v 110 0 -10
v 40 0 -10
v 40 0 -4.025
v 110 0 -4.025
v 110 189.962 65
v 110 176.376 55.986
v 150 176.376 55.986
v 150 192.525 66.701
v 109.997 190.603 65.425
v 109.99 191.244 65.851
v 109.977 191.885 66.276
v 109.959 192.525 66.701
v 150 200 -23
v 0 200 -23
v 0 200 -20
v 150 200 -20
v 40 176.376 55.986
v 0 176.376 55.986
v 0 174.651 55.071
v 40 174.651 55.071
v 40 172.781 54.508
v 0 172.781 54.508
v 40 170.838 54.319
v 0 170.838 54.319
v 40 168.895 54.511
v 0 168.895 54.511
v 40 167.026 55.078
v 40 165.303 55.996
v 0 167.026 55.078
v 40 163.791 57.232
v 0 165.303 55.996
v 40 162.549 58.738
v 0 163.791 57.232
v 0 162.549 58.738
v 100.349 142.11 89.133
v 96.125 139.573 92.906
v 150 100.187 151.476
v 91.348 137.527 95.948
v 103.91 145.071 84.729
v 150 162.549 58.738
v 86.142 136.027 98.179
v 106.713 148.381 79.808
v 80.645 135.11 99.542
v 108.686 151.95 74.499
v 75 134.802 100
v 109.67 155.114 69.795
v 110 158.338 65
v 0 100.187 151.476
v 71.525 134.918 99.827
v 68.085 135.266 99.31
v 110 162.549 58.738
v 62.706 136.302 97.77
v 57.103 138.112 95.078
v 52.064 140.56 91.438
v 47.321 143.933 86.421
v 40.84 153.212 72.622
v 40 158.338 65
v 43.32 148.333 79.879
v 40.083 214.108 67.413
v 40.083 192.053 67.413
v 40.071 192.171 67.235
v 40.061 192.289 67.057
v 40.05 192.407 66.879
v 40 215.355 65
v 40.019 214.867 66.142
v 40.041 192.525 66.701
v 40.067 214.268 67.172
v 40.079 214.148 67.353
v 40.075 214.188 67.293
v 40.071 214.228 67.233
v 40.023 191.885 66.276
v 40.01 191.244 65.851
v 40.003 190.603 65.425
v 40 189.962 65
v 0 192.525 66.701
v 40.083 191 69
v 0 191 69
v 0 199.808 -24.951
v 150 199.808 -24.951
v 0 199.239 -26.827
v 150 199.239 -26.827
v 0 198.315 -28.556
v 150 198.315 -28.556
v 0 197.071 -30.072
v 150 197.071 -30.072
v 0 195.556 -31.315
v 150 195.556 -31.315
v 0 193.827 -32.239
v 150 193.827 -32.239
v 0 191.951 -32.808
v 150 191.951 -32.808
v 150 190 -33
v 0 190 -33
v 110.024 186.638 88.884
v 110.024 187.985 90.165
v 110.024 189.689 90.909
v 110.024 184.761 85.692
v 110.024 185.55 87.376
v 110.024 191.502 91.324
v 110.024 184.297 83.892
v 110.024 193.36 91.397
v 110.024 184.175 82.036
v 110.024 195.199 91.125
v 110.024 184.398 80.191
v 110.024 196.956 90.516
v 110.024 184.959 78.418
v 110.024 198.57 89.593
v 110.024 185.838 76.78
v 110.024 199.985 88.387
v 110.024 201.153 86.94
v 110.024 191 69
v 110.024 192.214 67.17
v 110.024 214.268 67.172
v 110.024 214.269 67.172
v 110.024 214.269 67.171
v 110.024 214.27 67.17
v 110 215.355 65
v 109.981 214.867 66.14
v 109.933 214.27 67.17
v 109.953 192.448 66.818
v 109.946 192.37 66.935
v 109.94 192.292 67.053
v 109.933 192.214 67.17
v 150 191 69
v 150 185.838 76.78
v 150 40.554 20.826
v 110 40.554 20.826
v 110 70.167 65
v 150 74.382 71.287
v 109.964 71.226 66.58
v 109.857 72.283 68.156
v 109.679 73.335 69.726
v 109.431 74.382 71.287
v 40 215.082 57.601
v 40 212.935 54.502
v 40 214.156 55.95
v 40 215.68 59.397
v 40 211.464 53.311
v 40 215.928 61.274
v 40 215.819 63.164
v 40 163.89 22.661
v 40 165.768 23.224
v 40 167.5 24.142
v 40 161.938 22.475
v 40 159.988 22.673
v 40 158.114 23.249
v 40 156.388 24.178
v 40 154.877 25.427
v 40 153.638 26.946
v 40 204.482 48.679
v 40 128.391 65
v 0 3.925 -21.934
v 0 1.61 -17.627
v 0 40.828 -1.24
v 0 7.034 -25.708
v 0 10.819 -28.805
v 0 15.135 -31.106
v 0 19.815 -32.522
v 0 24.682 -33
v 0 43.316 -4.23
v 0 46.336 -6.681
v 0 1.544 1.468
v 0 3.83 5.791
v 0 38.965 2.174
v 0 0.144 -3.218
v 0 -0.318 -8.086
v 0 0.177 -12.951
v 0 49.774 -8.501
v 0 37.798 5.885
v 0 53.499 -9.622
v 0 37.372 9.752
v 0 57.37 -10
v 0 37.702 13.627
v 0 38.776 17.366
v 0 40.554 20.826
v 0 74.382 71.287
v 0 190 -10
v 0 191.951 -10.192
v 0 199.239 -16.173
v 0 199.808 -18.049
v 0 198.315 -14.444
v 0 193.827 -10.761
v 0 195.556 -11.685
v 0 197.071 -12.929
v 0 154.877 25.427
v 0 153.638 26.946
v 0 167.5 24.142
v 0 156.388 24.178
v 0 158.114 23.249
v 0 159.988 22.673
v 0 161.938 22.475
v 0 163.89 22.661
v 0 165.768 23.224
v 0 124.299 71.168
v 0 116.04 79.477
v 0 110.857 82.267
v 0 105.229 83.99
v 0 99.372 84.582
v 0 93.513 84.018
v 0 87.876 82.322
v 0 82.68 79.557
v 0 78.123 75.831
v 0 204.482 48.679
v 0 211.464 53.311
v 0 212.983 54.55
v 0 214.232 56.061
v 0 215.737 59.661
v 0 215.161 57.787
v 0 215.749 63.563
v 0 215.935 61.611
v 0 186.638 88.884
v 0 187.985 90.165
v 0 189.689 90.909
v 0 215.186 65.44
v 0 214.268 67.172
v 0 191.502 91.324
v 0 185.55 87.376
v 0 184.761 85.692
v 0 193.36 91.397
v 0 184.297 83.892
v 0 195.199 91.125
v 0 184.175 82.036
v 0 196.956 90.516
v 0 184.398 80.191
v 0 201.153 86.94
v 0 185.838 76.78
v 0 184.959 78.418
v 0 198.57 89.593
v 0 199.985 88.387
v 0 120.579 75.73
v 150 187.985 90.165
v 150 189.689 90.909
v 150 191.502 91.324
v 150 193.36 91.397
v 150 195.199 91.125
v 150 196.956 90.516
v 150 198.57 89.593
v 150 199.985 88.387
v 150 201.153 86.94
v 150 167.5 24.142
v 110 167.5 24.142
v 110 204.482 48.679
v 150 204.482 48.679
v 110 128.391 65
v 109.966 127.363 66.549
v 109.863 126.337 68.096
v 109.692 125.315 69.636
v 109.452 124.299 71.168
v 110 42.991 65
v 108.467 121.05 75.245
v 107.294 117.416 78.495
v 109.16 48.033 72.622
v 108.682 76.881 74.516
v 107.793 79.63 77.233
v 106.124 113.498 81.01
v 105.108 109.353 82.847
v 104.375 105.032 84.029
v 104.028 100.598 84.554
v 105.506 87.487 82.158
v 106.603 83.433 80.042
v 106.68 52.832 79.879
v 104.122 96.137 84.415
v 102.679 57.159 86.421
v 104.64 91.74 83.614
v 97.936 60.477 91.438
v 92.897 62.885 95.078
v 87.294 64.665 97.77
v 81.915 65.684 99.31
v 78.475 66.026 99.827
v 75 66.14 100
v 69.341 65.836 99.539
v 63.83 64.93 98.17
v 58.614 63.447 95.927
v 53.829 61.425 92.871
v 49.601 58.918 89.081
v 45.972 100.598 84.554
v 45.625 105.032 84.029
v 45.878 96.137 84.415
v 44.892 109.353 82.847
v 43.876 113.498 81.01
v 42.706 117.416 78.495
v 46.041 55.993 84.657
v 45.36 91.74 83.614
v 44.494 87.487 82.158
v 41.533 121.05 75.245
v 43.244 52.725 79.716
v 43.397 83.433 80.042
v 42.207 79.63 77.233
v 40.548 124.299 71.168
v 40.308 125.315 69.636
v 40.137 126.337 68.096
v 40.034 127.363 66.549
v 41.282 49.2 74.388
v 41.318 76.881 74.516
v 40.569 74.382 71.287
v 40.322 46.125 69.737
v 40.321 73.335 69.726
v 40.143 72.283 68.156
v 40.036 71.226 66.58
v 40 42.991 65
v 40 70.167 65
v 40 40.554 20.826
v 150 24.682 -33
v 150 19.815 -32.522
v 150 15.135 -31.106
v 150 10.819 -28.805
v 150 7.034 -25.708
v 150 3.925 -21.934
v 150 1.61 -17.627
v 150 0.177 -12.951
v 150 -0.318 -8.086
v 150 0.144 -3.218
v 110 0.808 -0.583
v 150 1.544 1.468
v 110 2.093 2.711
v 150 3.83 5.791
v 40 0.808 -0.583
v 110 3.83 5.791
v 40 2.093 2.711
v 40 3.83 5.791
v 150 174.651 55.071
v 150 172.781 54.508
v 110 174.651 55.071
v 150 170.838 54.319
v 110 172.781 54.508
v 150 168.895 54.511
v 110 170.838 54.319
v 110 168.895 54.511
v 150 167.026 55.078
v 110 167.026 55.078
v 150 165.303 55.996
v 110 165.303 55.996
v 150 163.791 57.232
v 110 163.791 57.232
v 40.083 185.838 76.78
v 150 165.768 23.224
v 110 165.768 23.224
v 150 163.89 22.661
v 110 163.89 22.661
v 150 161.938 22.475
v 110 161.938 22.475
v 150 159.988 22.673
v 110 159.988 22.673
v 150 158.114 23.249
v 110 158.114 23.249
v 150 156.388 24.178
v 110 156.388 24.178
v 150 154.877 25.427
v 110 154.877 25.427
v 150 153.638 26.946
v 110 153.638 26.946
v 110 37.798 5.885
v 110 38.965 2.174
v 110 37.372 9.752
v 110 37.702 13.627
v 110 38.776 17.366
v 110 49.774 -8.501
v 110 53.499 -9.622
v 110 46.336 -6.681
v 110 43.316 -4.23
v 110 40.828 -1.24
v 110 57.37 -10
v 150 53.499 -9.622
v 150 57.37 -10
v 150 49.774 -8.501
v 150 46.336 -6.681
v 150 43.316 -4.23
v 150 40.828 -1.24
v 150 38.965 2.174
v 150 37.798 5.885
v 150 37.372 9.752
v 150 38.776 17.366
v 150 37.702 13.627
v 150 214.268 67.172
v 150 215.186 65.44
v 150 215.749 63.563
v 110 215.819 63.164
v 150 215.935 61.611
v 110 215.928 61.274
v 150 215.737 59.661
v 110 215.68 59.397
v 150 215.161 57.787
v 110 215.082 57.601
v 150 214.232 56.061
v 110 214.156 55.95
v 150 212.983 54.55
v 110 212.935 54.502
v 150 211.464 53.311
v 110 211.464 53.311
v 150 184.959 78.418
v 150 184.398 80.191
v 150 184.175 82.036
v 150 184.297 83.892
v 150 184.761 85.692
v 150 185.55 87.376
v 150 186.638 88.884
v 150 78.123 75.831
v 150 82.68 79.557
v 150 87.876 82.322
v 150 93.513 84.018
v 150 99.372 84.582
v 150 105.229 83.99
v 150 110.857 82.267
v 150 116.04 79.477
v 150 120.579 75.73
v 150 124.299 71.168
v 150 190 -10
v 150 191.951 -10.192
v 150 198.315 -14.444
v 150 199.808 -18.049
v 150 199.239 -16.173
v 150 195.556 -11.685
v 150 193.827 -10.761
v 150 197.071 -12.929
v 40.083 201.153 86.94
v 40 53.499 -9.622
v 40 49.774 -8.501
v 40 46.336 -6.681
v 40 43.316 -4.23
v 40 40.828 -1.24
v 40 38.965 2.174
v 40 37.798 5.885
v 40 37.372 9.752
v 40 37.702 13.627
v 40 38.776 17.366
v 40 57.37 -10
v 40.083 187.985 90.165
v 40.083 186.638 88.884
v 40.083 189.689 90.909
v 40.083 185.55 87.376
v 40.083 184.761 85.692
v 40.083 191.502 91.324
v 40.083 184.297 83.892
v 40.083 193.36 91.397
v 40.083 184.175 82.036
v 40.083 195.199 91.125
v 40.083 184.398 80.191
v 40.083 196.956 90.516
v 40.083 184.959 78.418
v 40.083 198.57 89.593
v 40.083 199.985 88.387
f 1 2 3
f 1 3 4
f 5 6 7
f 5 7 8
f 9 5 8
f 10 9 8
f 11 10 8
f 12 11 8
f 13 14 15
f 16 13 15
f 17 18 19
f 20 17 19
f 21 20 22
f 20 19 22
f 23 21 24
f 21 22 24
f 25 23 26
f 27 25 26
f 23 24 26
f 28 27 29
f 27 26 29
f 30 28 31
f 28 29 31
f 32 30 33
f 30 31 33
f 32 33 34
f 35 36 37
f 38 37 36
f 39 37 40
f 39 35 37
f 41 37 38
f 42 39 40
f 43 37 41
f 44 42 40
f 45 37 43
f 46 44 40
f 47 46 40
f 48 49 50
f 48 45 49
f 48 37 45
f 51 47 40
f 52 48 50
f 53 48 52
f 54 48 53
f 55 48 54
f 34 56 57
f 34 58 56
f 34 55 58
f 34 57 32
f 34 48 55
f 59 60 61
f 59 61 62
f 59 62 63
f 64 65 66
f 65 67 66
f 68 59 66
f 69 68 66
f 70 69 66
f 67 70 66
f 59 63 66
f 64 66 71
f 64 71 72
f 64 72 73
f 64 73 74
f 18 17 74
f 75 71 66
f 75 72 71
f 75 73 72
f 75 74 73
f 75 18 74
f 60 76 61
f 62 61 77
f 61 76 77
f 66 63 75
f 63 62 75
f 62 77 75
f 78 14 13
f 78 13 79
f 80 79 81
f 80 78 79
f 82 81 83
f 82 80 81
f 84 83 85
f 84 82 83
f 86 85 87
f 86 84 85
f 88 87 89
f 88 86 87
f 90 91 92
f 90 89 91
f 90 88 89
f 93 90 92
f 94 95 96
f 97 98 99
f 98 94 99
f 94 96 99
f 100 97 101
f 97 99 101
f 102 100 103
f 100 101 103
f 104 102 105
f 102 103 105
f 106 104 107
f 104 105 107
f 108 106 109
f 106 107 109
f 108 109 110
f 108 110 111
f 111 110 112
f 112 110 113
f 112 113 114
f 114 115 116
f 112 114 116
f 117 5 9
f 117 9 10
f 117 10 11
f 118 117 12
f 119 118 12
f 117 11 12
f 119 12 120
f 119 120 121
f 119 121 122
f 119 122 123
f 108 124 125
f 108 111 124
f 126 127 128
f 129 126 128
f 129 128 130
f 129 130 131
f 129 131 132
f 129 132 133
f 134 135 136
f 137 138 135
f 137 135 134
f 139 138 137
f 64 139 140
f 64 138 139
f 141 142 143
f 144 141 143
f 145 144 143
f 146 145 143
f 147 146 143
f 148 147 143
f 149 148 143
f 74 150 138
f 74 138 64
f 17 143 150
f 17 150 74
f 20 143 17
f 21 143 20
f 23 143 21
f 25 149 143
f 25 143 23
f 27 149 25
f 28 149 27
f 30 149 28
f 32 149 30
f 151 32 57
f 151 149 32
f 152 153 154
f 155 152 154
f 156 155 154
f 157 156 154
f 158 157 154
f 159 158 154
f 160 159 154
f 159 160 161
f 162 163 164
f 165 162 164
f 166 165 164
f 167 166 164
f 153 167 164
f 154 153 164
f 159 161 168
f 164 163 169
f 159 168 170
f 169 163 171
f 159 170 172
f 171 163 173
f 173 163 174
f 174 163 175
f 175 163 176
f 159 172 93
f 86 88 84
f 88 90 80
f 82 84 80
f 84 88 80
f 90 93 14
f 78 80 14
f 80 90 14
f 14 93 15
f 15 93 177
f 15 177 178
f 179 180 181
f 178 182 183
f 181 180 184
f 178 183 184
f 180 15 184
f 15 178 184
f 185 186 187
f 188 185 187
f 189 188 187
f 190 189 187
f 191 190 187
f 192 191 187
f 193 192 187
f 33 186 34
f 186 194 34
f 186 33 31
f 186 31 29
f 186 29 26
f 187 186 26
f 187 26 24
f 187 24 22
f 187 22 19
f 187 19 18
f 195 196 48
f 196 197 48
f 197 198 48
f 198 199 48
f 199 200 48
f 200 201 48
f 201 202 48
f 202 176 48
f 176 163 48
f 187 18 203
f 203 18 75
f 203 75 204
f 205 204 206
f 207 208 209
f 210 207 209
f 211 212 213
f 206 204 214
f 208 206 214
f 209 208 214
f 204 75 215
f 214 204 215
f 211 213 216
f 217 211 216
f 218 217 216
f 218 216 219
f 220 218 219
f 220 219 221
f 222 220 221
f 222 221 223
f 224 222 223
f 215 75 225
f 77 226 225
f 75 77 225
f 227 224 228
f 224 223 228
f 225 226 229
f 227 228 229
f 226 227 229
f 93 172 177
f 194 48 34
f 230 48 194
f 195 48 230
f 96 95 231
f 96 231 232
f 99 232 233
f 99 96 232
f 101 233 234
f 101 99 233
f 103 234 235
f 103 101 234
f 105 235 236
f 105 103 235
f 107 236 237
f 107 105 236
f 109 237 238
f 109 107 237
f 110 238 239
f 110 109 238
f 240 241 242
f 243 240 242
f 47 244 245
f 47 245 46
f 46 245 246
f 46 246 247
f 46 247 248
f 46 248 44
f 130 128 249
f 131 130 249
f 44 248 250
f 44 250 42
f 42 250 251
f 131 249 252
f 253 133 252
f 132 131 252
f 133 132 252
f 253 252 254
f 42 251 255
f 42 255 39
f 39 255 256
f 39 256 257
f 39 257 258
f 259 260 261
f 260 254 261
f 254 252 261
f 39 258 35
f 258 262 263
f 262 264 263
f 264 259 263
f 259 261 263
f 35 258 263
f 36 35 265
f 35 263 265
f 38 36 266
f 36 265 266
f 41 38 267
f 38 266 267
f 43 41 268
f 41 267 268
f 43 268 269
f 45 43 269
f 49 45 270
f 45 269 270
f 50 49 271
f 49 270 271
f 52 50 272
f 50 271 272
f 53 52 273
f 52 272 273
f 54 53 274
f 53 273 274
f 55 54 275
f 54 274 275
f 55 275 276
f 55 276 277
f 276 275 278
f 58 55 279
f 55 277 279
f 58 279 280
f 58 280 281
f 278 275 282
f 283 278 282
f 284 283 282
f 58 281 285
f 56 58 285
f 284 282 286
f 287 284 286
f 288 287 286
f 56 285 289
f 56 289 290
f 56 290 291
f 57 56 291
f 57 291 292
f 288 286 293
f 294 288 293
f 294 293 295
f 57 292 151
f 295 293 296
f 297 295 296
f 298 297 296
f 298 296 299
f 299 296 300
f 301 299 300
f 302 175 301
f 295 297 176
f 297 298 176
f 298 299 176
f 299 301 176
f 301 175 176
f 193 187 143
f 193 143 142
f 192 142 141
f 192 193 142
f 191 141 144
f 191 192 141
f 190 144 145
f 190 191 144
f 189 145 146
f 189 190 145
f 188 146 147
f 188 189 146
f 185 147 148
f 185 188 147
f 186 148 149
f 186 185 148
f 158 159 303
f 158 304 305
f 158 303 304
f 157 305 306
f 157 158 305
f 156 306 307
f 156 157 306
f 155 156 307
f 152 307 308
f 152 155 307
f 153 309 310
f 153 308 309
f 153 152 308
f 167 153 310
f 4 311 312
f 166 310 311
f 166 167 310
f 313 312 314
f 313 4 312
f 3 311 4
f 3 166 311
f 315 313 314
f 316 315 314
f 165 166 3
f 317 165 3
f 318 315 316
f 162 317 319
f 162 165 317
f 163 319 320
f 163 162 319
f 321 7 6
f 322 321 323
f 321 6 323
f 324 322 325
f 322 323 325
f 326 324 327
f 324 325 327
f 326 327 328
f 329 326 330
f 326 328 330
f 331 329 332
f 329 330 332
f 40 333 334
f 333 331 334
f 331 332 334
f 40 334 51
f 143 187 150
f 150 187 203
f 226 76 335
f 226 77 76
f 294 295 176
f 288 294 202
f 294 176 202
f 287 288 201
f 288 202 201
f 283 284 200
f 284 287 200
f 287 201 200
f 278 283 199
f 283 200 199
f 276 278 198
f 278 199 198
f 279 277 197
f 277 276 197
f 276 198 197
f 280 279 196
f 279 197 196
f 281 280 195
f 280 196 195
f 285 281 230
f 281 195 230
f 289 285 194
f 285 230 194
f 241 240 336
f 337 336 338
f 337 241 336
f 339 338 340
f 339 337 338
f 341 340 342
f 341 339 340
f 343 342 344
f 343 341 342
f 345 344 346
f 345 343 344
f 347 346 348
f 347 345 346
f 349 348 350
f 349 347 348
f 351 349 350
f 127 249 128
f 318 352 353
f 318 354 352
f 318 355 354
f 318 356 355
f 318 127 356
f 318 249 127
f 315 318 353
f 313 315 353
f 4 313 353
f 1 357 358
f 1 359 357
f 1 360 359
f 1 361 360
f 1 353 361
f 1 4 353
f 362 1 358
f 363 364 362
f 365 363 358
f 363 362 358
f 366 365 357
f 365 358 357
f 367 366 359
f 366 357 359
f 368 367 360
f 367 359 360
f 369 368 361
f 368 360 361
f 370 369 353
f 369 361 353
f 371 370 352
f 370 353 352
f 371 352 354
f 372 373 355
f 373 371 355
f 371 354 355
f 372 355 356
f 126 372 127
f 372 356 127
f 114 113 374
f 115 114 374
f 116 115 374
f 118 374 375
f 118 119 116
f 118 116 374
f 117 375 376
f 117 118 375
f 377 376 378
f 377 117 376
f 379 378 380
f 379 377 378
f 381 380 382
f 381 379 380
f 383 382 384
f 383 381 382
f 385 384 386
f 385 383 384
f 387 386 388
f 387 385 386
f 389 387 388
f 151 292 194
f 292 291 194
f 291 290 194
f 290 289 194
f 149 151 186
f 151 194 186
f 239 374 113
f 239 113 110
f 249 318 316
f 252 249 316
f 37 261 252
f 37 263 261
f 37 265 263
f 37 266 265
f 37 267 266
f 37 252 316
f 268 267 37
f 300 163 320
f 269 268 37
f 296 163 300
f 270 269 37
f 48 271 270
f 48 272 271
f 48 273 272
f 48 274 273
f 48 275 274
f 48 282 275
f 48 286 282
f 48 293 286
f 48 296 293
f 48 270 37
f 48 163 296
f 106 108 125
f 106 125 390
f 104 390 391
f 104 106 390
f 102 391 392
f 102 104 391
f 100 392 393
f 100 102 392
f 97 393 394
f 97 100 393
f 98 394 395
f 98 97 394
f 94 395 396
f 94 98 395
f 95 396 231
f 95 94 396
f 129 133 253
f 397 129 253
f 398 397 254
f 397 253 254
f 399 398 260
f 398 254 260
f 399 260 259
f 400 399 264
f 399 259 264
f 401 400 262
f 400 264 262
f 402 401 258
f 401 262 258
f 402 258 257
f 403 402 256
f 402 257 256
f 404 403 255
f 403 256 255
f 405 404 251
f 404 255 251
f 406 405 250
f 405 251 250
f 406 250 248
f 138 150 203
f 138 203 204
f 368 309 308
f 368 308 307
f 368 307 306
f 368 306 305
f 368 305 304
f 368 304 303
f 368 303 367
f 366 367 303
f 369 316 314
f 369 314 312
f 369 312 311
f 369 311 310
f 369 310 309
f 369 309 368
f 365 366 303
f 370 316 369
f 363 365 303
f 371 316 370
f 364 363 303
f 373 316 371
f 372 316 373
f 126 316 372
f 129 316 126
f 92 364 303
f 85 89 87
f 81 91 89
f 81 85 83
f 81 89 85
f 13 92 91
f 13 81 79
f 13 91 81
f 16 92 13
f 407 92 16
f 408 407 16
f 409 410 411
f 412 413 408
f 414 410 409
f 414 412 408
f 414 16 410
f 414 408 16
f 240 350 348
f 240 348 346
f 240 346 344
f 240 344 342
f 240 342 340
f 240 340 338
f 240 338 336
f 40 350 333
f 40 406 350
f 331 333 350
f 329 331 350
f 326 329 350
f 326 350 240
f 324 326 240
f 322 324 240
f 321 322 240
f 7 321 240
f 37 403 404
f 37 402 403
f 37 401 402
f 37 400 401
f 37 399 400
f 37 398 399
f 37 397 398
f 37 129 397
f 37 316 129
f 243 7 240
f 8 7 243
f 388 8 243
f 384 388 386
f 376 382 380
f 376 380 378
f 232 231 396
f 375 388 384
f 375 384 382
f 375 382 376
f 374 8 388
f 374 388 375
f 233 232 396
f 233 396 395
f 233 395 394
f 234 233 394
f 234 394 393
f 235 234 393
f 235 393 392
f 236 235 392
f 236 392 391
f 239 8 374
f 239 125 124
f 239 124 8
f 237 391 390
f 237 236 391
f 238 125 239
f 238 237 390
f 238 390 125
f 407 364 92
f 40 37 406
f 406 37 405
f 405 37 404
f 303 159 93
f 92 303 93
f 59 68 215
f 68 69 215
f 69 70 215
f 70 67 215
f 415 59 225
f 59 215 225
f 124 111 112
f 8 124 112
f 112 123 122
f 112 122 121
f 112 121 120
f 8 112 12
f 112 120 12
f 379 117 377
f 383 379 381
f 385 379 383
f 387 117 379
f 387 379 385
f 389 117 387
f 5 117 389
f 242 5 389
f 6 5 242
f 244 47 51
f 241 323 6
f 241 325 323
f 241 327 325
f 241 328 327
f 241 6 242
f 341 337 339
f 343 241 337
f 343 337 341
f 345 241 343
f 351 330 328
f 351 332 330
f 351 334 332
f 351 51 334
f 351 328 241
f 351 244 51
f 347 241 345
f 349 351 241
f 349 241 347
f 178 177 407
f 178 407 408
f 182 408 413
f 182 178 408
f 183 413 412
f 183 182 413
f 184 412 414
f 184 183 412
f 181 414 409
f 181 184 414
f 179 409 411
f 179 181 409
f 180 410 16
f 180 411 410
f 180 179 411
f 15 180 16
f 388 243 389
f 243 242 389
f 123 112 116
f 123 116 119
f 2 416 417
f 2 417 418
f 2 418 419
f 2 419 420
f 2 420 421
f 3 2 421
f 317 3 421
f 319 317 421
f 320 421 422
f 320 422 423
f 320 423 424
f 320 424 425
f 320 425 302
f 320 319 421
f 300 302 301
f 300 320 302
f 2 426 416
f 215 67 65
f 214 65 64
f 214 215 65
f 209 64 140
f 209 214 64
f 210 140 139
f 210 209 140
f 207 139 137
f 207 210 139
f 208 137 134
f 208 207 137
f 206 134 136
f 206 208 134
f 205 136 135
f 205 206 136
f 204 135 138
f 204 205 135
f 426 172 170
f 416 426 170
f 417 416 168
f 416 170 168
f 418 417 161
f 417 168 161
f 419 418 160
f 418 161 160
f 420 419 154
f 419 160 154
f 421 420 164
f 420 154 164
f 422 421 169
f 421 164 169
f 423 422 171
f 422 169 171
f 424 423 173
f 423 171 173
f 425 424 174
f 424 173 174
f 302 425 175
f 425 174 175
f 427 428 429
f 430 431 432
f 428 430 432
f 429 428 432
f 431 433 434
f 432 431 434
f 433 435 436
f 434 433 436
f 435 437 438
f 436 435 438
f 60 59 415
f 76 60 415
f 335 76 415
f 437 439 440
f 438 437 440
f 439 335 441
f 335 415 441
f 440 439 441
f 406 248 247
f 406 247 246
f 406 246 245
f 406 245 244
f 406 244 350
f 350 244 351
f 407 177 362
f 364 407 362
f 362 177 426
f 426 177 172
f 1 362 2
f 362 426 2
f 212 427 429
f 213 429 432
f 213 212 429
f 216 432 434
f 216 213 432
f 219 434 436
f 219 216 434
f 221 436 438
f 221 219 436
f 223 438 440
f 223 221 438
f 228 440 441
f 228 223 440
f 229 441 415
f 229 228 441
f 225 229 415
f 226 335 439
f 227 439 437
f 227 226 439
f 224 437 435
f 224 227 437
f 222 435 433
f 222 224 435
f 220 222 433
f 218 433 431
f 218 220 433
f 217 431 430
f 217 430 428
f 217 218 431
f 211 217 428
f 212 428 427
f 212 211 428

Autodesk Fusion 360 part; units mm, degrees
sketch "Sketch1" plane through (0, 0, 0) normal (1, 0, 0) x (0, 1, 0)
  line L0 (0, 0) -> (100.1869, 151.4759)
  line L1 (100.1869, 151.4759) -> (162.5488, 58.7385)
  line L2 (40.0071, 20.0106) -> (74.3816, 71.287)
  line L3 (124.2987, 71.1676) -> (153.6381, 26.9463)
  line L4 (167.4995, 24.1421) -> (204.4823, 48.679)
  line L5 (176.3756, 55.986) -> (192.5254, 66.7009)
  line L6 (191, 69) -> (192.5254, 66.7009)
  line L7 (0, 0) -> (3.8301, 5.7909)
  line L8 (24.6819, -33.0005) -> (190, -33.0005)
  line L9 (200, -23.0005) -> (200, -20)
  line L10 (190, -10) -> (57.3703, -10)
  line L11 (40.7293, 21.094) -> (39.9929, 19.9893)
  line L12 (191, 69) -> (185.8385, 76.7796)
  line L13 (204.4823, 48.679) -> (211.4637, 53.311)
  line L14 (214.268, 67.1723) -> (201.1527, 86.9401)
  line L15 (188.6427, 90.641) -> (187.2913, 89.7444)
  arc A0 (40.0071, 20.0106) -> (39.9929, 19.9893) centre (48.3134, 14.4423) ccw
  arc A1 (40.7293, 21.094) -> (57.3703, -10) centre (57.3703, 10) ccw
  arc A2 (3.8301, 5.7909) -> (24.6819, -33.0005) centre (24.6819, -8.0005) ccw
  arc A3 (200, -20) -> (190, -10) centre (190, -20) ccw
  arc A4 (190, -33.0005) -> (200, -23.0005) centre (190, -23.0005) ccw
  arc A5 (124.2987, 71.1676) -> (74.3816, 71.287) centre (99.3004, 54.582) ccw
  arc A6 (153.6381, 26.9463) -> (167.4995, 24.1421) centre (161.9709, 32.4749) ccw
  arc A7 (211.4637, 53.311) -> (214.268, 67.1723) centre (205.9352, 61.6438) ccw
  arc A8 (188.6427, 90.641) -> (185.8385, 76.7796) centre (194.1712, 82.3082) ccw
  arc A9 (201.1527, 86.9401) -> (187.2913, 89.7444) centre (192.8199, 81.4116) ccw
  arc A10 (162.5488, 58.7385) -> (176.3756, 55.986) centre (170.8471, 64.3188) ccw
  dimension "d1" = 67.4
  dimension "d2" = 67.4
  dimension "d3" = 10
  dimension "d4" = 20
  dimension "d5" = 25
  dimension "d6" = 10
  dimension "d7" = 30
  dimension "d8" = 10
  dimension "d9" = 10
  dimension "d10" = 10
  dimension "d11" = 10
extrude "Extrude1" add sketch "Sketch1" along normal blind 150 contours L2 L11 A1 | L0 L1 L2 L3 L4 L5 L6 L8 L9 L10 L12 L13 L14 A1 A2 A3 A4 A5 A6 A7 A8 A9 A10
sketch "Sketch2" plane through (0, 0, 0) normal (0, 1, 0) x (1, 0, 0)
  line L0 (110, 10) -> (40, 10)
  line L1 (40, 10) -> (40, -65)
  line L2 (75, -100) -> (75, -100)
  line L3 (110, -65) -> (110, 10)
  arc A0 (40, -65) -> (75, -100) centre (75, -65) ccw
  arc A1 (75, -100) -> (110, -65) centre (75, -65) ccw
  dimension "d14" = 35
extrude "Extrude2" cut sketch "Sketch2" along normal blind 220
ref_plane "WorkPlane1" through (0, 230, 0) normal (0, 1, 0) x (0, 0, 1)
sketch "Sketch3" plane through (0, 230, 0) normal (0, 1, 0) x (1, 0, 0)
  line L0 (40.0833, -92.7367) -> (110.0244, -92.7367)
  line L1 (110.0244, -92.7367) -> (110.0244, -67.17)
  line L2 (110.0244, -67.17) -> (40.0833, -67.17)
  line L3 (40.0833, -67.17) -> (40.0833, -92.7367)
extrude "Extrude3" cut sketch "Sketch3" against normal blind 60
